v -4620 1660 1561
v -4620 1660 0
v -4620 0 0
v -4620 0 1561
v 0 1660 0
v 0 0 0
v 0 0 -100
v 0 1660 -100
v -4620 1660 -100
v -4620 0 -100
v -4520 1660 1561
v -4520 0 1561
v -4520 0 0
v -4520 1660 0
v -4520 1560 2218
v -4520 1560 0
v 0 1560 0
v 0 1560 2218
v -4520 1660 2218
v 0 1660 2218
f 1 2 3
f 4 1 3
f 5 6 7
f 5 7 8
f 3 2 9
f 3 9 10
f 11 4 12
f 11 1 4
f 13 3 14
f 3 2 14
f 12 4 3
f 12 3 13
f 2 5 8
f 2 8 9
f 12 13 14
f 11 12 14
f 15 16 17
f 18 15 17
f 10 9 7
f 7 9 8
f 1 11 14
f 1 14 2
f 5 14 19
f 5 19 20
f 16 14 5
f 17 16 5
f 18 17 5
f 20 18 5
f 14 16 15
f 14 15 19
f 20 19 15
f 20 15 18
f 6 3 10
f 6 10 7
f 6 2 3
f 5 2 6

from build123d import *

# Parameters (mm, degrees)
F0_W     = 4520
F0_H     = 1560
F1_DEPTH = 100
F0_H_2   = 100
F2_DEPTH = 2218
F3_DEPTH = 100
F4_DEPTH = 1561
F5_DEPTH = 100


with BuildPart() as f1:
    # F0 (on Top) → F1 (new body)
    with BuildSketch(Plane.XY):
        with Locations((-2260, 780)):
            Rectangle(F0_W, F0_H)
    extrude(amount=-F1_DEPTH)

    # F0 (on Top) → F3 (join)
    with BuildSketch(Plane.XY):
        with Locations((-2260, 1610)):
            Rectangle(F0_W, F0_H_2)
    extrude(amount=-F3_DEPTH)

    # F0 (on Top) → F5 (join)
    with BuildSketch(Plane.XY):
        Polygon((-4620, 0), (-4520, 0), (-4520, 1560), (-4520, 1660), (-4620, 1660), align=None)
    extrude(amount=-F5_DEPTH)


with BuildPart() as f2:
    # F0 (on Top) → F2 (new body)
    with BuildSketch(Plane.XY):
        with Locations((-2260, 1610)):
            Rectangle(F0_W, F0_H_2)
    extrude(amount=F2_DEPTH)


with BuildPart() as f4:
    # F0 (on Top) → F4 (new body)
    with BuildSketch(Plane.XY):
        Polygon((-4620, 0), (-4520, 0), (-4520, 1560), (-4520, 1660), (-4620, 1660), align=None)
    extrude(amount=F4_DEPTH)


solid = Compound([f1.part, f2.part, f4.part])
